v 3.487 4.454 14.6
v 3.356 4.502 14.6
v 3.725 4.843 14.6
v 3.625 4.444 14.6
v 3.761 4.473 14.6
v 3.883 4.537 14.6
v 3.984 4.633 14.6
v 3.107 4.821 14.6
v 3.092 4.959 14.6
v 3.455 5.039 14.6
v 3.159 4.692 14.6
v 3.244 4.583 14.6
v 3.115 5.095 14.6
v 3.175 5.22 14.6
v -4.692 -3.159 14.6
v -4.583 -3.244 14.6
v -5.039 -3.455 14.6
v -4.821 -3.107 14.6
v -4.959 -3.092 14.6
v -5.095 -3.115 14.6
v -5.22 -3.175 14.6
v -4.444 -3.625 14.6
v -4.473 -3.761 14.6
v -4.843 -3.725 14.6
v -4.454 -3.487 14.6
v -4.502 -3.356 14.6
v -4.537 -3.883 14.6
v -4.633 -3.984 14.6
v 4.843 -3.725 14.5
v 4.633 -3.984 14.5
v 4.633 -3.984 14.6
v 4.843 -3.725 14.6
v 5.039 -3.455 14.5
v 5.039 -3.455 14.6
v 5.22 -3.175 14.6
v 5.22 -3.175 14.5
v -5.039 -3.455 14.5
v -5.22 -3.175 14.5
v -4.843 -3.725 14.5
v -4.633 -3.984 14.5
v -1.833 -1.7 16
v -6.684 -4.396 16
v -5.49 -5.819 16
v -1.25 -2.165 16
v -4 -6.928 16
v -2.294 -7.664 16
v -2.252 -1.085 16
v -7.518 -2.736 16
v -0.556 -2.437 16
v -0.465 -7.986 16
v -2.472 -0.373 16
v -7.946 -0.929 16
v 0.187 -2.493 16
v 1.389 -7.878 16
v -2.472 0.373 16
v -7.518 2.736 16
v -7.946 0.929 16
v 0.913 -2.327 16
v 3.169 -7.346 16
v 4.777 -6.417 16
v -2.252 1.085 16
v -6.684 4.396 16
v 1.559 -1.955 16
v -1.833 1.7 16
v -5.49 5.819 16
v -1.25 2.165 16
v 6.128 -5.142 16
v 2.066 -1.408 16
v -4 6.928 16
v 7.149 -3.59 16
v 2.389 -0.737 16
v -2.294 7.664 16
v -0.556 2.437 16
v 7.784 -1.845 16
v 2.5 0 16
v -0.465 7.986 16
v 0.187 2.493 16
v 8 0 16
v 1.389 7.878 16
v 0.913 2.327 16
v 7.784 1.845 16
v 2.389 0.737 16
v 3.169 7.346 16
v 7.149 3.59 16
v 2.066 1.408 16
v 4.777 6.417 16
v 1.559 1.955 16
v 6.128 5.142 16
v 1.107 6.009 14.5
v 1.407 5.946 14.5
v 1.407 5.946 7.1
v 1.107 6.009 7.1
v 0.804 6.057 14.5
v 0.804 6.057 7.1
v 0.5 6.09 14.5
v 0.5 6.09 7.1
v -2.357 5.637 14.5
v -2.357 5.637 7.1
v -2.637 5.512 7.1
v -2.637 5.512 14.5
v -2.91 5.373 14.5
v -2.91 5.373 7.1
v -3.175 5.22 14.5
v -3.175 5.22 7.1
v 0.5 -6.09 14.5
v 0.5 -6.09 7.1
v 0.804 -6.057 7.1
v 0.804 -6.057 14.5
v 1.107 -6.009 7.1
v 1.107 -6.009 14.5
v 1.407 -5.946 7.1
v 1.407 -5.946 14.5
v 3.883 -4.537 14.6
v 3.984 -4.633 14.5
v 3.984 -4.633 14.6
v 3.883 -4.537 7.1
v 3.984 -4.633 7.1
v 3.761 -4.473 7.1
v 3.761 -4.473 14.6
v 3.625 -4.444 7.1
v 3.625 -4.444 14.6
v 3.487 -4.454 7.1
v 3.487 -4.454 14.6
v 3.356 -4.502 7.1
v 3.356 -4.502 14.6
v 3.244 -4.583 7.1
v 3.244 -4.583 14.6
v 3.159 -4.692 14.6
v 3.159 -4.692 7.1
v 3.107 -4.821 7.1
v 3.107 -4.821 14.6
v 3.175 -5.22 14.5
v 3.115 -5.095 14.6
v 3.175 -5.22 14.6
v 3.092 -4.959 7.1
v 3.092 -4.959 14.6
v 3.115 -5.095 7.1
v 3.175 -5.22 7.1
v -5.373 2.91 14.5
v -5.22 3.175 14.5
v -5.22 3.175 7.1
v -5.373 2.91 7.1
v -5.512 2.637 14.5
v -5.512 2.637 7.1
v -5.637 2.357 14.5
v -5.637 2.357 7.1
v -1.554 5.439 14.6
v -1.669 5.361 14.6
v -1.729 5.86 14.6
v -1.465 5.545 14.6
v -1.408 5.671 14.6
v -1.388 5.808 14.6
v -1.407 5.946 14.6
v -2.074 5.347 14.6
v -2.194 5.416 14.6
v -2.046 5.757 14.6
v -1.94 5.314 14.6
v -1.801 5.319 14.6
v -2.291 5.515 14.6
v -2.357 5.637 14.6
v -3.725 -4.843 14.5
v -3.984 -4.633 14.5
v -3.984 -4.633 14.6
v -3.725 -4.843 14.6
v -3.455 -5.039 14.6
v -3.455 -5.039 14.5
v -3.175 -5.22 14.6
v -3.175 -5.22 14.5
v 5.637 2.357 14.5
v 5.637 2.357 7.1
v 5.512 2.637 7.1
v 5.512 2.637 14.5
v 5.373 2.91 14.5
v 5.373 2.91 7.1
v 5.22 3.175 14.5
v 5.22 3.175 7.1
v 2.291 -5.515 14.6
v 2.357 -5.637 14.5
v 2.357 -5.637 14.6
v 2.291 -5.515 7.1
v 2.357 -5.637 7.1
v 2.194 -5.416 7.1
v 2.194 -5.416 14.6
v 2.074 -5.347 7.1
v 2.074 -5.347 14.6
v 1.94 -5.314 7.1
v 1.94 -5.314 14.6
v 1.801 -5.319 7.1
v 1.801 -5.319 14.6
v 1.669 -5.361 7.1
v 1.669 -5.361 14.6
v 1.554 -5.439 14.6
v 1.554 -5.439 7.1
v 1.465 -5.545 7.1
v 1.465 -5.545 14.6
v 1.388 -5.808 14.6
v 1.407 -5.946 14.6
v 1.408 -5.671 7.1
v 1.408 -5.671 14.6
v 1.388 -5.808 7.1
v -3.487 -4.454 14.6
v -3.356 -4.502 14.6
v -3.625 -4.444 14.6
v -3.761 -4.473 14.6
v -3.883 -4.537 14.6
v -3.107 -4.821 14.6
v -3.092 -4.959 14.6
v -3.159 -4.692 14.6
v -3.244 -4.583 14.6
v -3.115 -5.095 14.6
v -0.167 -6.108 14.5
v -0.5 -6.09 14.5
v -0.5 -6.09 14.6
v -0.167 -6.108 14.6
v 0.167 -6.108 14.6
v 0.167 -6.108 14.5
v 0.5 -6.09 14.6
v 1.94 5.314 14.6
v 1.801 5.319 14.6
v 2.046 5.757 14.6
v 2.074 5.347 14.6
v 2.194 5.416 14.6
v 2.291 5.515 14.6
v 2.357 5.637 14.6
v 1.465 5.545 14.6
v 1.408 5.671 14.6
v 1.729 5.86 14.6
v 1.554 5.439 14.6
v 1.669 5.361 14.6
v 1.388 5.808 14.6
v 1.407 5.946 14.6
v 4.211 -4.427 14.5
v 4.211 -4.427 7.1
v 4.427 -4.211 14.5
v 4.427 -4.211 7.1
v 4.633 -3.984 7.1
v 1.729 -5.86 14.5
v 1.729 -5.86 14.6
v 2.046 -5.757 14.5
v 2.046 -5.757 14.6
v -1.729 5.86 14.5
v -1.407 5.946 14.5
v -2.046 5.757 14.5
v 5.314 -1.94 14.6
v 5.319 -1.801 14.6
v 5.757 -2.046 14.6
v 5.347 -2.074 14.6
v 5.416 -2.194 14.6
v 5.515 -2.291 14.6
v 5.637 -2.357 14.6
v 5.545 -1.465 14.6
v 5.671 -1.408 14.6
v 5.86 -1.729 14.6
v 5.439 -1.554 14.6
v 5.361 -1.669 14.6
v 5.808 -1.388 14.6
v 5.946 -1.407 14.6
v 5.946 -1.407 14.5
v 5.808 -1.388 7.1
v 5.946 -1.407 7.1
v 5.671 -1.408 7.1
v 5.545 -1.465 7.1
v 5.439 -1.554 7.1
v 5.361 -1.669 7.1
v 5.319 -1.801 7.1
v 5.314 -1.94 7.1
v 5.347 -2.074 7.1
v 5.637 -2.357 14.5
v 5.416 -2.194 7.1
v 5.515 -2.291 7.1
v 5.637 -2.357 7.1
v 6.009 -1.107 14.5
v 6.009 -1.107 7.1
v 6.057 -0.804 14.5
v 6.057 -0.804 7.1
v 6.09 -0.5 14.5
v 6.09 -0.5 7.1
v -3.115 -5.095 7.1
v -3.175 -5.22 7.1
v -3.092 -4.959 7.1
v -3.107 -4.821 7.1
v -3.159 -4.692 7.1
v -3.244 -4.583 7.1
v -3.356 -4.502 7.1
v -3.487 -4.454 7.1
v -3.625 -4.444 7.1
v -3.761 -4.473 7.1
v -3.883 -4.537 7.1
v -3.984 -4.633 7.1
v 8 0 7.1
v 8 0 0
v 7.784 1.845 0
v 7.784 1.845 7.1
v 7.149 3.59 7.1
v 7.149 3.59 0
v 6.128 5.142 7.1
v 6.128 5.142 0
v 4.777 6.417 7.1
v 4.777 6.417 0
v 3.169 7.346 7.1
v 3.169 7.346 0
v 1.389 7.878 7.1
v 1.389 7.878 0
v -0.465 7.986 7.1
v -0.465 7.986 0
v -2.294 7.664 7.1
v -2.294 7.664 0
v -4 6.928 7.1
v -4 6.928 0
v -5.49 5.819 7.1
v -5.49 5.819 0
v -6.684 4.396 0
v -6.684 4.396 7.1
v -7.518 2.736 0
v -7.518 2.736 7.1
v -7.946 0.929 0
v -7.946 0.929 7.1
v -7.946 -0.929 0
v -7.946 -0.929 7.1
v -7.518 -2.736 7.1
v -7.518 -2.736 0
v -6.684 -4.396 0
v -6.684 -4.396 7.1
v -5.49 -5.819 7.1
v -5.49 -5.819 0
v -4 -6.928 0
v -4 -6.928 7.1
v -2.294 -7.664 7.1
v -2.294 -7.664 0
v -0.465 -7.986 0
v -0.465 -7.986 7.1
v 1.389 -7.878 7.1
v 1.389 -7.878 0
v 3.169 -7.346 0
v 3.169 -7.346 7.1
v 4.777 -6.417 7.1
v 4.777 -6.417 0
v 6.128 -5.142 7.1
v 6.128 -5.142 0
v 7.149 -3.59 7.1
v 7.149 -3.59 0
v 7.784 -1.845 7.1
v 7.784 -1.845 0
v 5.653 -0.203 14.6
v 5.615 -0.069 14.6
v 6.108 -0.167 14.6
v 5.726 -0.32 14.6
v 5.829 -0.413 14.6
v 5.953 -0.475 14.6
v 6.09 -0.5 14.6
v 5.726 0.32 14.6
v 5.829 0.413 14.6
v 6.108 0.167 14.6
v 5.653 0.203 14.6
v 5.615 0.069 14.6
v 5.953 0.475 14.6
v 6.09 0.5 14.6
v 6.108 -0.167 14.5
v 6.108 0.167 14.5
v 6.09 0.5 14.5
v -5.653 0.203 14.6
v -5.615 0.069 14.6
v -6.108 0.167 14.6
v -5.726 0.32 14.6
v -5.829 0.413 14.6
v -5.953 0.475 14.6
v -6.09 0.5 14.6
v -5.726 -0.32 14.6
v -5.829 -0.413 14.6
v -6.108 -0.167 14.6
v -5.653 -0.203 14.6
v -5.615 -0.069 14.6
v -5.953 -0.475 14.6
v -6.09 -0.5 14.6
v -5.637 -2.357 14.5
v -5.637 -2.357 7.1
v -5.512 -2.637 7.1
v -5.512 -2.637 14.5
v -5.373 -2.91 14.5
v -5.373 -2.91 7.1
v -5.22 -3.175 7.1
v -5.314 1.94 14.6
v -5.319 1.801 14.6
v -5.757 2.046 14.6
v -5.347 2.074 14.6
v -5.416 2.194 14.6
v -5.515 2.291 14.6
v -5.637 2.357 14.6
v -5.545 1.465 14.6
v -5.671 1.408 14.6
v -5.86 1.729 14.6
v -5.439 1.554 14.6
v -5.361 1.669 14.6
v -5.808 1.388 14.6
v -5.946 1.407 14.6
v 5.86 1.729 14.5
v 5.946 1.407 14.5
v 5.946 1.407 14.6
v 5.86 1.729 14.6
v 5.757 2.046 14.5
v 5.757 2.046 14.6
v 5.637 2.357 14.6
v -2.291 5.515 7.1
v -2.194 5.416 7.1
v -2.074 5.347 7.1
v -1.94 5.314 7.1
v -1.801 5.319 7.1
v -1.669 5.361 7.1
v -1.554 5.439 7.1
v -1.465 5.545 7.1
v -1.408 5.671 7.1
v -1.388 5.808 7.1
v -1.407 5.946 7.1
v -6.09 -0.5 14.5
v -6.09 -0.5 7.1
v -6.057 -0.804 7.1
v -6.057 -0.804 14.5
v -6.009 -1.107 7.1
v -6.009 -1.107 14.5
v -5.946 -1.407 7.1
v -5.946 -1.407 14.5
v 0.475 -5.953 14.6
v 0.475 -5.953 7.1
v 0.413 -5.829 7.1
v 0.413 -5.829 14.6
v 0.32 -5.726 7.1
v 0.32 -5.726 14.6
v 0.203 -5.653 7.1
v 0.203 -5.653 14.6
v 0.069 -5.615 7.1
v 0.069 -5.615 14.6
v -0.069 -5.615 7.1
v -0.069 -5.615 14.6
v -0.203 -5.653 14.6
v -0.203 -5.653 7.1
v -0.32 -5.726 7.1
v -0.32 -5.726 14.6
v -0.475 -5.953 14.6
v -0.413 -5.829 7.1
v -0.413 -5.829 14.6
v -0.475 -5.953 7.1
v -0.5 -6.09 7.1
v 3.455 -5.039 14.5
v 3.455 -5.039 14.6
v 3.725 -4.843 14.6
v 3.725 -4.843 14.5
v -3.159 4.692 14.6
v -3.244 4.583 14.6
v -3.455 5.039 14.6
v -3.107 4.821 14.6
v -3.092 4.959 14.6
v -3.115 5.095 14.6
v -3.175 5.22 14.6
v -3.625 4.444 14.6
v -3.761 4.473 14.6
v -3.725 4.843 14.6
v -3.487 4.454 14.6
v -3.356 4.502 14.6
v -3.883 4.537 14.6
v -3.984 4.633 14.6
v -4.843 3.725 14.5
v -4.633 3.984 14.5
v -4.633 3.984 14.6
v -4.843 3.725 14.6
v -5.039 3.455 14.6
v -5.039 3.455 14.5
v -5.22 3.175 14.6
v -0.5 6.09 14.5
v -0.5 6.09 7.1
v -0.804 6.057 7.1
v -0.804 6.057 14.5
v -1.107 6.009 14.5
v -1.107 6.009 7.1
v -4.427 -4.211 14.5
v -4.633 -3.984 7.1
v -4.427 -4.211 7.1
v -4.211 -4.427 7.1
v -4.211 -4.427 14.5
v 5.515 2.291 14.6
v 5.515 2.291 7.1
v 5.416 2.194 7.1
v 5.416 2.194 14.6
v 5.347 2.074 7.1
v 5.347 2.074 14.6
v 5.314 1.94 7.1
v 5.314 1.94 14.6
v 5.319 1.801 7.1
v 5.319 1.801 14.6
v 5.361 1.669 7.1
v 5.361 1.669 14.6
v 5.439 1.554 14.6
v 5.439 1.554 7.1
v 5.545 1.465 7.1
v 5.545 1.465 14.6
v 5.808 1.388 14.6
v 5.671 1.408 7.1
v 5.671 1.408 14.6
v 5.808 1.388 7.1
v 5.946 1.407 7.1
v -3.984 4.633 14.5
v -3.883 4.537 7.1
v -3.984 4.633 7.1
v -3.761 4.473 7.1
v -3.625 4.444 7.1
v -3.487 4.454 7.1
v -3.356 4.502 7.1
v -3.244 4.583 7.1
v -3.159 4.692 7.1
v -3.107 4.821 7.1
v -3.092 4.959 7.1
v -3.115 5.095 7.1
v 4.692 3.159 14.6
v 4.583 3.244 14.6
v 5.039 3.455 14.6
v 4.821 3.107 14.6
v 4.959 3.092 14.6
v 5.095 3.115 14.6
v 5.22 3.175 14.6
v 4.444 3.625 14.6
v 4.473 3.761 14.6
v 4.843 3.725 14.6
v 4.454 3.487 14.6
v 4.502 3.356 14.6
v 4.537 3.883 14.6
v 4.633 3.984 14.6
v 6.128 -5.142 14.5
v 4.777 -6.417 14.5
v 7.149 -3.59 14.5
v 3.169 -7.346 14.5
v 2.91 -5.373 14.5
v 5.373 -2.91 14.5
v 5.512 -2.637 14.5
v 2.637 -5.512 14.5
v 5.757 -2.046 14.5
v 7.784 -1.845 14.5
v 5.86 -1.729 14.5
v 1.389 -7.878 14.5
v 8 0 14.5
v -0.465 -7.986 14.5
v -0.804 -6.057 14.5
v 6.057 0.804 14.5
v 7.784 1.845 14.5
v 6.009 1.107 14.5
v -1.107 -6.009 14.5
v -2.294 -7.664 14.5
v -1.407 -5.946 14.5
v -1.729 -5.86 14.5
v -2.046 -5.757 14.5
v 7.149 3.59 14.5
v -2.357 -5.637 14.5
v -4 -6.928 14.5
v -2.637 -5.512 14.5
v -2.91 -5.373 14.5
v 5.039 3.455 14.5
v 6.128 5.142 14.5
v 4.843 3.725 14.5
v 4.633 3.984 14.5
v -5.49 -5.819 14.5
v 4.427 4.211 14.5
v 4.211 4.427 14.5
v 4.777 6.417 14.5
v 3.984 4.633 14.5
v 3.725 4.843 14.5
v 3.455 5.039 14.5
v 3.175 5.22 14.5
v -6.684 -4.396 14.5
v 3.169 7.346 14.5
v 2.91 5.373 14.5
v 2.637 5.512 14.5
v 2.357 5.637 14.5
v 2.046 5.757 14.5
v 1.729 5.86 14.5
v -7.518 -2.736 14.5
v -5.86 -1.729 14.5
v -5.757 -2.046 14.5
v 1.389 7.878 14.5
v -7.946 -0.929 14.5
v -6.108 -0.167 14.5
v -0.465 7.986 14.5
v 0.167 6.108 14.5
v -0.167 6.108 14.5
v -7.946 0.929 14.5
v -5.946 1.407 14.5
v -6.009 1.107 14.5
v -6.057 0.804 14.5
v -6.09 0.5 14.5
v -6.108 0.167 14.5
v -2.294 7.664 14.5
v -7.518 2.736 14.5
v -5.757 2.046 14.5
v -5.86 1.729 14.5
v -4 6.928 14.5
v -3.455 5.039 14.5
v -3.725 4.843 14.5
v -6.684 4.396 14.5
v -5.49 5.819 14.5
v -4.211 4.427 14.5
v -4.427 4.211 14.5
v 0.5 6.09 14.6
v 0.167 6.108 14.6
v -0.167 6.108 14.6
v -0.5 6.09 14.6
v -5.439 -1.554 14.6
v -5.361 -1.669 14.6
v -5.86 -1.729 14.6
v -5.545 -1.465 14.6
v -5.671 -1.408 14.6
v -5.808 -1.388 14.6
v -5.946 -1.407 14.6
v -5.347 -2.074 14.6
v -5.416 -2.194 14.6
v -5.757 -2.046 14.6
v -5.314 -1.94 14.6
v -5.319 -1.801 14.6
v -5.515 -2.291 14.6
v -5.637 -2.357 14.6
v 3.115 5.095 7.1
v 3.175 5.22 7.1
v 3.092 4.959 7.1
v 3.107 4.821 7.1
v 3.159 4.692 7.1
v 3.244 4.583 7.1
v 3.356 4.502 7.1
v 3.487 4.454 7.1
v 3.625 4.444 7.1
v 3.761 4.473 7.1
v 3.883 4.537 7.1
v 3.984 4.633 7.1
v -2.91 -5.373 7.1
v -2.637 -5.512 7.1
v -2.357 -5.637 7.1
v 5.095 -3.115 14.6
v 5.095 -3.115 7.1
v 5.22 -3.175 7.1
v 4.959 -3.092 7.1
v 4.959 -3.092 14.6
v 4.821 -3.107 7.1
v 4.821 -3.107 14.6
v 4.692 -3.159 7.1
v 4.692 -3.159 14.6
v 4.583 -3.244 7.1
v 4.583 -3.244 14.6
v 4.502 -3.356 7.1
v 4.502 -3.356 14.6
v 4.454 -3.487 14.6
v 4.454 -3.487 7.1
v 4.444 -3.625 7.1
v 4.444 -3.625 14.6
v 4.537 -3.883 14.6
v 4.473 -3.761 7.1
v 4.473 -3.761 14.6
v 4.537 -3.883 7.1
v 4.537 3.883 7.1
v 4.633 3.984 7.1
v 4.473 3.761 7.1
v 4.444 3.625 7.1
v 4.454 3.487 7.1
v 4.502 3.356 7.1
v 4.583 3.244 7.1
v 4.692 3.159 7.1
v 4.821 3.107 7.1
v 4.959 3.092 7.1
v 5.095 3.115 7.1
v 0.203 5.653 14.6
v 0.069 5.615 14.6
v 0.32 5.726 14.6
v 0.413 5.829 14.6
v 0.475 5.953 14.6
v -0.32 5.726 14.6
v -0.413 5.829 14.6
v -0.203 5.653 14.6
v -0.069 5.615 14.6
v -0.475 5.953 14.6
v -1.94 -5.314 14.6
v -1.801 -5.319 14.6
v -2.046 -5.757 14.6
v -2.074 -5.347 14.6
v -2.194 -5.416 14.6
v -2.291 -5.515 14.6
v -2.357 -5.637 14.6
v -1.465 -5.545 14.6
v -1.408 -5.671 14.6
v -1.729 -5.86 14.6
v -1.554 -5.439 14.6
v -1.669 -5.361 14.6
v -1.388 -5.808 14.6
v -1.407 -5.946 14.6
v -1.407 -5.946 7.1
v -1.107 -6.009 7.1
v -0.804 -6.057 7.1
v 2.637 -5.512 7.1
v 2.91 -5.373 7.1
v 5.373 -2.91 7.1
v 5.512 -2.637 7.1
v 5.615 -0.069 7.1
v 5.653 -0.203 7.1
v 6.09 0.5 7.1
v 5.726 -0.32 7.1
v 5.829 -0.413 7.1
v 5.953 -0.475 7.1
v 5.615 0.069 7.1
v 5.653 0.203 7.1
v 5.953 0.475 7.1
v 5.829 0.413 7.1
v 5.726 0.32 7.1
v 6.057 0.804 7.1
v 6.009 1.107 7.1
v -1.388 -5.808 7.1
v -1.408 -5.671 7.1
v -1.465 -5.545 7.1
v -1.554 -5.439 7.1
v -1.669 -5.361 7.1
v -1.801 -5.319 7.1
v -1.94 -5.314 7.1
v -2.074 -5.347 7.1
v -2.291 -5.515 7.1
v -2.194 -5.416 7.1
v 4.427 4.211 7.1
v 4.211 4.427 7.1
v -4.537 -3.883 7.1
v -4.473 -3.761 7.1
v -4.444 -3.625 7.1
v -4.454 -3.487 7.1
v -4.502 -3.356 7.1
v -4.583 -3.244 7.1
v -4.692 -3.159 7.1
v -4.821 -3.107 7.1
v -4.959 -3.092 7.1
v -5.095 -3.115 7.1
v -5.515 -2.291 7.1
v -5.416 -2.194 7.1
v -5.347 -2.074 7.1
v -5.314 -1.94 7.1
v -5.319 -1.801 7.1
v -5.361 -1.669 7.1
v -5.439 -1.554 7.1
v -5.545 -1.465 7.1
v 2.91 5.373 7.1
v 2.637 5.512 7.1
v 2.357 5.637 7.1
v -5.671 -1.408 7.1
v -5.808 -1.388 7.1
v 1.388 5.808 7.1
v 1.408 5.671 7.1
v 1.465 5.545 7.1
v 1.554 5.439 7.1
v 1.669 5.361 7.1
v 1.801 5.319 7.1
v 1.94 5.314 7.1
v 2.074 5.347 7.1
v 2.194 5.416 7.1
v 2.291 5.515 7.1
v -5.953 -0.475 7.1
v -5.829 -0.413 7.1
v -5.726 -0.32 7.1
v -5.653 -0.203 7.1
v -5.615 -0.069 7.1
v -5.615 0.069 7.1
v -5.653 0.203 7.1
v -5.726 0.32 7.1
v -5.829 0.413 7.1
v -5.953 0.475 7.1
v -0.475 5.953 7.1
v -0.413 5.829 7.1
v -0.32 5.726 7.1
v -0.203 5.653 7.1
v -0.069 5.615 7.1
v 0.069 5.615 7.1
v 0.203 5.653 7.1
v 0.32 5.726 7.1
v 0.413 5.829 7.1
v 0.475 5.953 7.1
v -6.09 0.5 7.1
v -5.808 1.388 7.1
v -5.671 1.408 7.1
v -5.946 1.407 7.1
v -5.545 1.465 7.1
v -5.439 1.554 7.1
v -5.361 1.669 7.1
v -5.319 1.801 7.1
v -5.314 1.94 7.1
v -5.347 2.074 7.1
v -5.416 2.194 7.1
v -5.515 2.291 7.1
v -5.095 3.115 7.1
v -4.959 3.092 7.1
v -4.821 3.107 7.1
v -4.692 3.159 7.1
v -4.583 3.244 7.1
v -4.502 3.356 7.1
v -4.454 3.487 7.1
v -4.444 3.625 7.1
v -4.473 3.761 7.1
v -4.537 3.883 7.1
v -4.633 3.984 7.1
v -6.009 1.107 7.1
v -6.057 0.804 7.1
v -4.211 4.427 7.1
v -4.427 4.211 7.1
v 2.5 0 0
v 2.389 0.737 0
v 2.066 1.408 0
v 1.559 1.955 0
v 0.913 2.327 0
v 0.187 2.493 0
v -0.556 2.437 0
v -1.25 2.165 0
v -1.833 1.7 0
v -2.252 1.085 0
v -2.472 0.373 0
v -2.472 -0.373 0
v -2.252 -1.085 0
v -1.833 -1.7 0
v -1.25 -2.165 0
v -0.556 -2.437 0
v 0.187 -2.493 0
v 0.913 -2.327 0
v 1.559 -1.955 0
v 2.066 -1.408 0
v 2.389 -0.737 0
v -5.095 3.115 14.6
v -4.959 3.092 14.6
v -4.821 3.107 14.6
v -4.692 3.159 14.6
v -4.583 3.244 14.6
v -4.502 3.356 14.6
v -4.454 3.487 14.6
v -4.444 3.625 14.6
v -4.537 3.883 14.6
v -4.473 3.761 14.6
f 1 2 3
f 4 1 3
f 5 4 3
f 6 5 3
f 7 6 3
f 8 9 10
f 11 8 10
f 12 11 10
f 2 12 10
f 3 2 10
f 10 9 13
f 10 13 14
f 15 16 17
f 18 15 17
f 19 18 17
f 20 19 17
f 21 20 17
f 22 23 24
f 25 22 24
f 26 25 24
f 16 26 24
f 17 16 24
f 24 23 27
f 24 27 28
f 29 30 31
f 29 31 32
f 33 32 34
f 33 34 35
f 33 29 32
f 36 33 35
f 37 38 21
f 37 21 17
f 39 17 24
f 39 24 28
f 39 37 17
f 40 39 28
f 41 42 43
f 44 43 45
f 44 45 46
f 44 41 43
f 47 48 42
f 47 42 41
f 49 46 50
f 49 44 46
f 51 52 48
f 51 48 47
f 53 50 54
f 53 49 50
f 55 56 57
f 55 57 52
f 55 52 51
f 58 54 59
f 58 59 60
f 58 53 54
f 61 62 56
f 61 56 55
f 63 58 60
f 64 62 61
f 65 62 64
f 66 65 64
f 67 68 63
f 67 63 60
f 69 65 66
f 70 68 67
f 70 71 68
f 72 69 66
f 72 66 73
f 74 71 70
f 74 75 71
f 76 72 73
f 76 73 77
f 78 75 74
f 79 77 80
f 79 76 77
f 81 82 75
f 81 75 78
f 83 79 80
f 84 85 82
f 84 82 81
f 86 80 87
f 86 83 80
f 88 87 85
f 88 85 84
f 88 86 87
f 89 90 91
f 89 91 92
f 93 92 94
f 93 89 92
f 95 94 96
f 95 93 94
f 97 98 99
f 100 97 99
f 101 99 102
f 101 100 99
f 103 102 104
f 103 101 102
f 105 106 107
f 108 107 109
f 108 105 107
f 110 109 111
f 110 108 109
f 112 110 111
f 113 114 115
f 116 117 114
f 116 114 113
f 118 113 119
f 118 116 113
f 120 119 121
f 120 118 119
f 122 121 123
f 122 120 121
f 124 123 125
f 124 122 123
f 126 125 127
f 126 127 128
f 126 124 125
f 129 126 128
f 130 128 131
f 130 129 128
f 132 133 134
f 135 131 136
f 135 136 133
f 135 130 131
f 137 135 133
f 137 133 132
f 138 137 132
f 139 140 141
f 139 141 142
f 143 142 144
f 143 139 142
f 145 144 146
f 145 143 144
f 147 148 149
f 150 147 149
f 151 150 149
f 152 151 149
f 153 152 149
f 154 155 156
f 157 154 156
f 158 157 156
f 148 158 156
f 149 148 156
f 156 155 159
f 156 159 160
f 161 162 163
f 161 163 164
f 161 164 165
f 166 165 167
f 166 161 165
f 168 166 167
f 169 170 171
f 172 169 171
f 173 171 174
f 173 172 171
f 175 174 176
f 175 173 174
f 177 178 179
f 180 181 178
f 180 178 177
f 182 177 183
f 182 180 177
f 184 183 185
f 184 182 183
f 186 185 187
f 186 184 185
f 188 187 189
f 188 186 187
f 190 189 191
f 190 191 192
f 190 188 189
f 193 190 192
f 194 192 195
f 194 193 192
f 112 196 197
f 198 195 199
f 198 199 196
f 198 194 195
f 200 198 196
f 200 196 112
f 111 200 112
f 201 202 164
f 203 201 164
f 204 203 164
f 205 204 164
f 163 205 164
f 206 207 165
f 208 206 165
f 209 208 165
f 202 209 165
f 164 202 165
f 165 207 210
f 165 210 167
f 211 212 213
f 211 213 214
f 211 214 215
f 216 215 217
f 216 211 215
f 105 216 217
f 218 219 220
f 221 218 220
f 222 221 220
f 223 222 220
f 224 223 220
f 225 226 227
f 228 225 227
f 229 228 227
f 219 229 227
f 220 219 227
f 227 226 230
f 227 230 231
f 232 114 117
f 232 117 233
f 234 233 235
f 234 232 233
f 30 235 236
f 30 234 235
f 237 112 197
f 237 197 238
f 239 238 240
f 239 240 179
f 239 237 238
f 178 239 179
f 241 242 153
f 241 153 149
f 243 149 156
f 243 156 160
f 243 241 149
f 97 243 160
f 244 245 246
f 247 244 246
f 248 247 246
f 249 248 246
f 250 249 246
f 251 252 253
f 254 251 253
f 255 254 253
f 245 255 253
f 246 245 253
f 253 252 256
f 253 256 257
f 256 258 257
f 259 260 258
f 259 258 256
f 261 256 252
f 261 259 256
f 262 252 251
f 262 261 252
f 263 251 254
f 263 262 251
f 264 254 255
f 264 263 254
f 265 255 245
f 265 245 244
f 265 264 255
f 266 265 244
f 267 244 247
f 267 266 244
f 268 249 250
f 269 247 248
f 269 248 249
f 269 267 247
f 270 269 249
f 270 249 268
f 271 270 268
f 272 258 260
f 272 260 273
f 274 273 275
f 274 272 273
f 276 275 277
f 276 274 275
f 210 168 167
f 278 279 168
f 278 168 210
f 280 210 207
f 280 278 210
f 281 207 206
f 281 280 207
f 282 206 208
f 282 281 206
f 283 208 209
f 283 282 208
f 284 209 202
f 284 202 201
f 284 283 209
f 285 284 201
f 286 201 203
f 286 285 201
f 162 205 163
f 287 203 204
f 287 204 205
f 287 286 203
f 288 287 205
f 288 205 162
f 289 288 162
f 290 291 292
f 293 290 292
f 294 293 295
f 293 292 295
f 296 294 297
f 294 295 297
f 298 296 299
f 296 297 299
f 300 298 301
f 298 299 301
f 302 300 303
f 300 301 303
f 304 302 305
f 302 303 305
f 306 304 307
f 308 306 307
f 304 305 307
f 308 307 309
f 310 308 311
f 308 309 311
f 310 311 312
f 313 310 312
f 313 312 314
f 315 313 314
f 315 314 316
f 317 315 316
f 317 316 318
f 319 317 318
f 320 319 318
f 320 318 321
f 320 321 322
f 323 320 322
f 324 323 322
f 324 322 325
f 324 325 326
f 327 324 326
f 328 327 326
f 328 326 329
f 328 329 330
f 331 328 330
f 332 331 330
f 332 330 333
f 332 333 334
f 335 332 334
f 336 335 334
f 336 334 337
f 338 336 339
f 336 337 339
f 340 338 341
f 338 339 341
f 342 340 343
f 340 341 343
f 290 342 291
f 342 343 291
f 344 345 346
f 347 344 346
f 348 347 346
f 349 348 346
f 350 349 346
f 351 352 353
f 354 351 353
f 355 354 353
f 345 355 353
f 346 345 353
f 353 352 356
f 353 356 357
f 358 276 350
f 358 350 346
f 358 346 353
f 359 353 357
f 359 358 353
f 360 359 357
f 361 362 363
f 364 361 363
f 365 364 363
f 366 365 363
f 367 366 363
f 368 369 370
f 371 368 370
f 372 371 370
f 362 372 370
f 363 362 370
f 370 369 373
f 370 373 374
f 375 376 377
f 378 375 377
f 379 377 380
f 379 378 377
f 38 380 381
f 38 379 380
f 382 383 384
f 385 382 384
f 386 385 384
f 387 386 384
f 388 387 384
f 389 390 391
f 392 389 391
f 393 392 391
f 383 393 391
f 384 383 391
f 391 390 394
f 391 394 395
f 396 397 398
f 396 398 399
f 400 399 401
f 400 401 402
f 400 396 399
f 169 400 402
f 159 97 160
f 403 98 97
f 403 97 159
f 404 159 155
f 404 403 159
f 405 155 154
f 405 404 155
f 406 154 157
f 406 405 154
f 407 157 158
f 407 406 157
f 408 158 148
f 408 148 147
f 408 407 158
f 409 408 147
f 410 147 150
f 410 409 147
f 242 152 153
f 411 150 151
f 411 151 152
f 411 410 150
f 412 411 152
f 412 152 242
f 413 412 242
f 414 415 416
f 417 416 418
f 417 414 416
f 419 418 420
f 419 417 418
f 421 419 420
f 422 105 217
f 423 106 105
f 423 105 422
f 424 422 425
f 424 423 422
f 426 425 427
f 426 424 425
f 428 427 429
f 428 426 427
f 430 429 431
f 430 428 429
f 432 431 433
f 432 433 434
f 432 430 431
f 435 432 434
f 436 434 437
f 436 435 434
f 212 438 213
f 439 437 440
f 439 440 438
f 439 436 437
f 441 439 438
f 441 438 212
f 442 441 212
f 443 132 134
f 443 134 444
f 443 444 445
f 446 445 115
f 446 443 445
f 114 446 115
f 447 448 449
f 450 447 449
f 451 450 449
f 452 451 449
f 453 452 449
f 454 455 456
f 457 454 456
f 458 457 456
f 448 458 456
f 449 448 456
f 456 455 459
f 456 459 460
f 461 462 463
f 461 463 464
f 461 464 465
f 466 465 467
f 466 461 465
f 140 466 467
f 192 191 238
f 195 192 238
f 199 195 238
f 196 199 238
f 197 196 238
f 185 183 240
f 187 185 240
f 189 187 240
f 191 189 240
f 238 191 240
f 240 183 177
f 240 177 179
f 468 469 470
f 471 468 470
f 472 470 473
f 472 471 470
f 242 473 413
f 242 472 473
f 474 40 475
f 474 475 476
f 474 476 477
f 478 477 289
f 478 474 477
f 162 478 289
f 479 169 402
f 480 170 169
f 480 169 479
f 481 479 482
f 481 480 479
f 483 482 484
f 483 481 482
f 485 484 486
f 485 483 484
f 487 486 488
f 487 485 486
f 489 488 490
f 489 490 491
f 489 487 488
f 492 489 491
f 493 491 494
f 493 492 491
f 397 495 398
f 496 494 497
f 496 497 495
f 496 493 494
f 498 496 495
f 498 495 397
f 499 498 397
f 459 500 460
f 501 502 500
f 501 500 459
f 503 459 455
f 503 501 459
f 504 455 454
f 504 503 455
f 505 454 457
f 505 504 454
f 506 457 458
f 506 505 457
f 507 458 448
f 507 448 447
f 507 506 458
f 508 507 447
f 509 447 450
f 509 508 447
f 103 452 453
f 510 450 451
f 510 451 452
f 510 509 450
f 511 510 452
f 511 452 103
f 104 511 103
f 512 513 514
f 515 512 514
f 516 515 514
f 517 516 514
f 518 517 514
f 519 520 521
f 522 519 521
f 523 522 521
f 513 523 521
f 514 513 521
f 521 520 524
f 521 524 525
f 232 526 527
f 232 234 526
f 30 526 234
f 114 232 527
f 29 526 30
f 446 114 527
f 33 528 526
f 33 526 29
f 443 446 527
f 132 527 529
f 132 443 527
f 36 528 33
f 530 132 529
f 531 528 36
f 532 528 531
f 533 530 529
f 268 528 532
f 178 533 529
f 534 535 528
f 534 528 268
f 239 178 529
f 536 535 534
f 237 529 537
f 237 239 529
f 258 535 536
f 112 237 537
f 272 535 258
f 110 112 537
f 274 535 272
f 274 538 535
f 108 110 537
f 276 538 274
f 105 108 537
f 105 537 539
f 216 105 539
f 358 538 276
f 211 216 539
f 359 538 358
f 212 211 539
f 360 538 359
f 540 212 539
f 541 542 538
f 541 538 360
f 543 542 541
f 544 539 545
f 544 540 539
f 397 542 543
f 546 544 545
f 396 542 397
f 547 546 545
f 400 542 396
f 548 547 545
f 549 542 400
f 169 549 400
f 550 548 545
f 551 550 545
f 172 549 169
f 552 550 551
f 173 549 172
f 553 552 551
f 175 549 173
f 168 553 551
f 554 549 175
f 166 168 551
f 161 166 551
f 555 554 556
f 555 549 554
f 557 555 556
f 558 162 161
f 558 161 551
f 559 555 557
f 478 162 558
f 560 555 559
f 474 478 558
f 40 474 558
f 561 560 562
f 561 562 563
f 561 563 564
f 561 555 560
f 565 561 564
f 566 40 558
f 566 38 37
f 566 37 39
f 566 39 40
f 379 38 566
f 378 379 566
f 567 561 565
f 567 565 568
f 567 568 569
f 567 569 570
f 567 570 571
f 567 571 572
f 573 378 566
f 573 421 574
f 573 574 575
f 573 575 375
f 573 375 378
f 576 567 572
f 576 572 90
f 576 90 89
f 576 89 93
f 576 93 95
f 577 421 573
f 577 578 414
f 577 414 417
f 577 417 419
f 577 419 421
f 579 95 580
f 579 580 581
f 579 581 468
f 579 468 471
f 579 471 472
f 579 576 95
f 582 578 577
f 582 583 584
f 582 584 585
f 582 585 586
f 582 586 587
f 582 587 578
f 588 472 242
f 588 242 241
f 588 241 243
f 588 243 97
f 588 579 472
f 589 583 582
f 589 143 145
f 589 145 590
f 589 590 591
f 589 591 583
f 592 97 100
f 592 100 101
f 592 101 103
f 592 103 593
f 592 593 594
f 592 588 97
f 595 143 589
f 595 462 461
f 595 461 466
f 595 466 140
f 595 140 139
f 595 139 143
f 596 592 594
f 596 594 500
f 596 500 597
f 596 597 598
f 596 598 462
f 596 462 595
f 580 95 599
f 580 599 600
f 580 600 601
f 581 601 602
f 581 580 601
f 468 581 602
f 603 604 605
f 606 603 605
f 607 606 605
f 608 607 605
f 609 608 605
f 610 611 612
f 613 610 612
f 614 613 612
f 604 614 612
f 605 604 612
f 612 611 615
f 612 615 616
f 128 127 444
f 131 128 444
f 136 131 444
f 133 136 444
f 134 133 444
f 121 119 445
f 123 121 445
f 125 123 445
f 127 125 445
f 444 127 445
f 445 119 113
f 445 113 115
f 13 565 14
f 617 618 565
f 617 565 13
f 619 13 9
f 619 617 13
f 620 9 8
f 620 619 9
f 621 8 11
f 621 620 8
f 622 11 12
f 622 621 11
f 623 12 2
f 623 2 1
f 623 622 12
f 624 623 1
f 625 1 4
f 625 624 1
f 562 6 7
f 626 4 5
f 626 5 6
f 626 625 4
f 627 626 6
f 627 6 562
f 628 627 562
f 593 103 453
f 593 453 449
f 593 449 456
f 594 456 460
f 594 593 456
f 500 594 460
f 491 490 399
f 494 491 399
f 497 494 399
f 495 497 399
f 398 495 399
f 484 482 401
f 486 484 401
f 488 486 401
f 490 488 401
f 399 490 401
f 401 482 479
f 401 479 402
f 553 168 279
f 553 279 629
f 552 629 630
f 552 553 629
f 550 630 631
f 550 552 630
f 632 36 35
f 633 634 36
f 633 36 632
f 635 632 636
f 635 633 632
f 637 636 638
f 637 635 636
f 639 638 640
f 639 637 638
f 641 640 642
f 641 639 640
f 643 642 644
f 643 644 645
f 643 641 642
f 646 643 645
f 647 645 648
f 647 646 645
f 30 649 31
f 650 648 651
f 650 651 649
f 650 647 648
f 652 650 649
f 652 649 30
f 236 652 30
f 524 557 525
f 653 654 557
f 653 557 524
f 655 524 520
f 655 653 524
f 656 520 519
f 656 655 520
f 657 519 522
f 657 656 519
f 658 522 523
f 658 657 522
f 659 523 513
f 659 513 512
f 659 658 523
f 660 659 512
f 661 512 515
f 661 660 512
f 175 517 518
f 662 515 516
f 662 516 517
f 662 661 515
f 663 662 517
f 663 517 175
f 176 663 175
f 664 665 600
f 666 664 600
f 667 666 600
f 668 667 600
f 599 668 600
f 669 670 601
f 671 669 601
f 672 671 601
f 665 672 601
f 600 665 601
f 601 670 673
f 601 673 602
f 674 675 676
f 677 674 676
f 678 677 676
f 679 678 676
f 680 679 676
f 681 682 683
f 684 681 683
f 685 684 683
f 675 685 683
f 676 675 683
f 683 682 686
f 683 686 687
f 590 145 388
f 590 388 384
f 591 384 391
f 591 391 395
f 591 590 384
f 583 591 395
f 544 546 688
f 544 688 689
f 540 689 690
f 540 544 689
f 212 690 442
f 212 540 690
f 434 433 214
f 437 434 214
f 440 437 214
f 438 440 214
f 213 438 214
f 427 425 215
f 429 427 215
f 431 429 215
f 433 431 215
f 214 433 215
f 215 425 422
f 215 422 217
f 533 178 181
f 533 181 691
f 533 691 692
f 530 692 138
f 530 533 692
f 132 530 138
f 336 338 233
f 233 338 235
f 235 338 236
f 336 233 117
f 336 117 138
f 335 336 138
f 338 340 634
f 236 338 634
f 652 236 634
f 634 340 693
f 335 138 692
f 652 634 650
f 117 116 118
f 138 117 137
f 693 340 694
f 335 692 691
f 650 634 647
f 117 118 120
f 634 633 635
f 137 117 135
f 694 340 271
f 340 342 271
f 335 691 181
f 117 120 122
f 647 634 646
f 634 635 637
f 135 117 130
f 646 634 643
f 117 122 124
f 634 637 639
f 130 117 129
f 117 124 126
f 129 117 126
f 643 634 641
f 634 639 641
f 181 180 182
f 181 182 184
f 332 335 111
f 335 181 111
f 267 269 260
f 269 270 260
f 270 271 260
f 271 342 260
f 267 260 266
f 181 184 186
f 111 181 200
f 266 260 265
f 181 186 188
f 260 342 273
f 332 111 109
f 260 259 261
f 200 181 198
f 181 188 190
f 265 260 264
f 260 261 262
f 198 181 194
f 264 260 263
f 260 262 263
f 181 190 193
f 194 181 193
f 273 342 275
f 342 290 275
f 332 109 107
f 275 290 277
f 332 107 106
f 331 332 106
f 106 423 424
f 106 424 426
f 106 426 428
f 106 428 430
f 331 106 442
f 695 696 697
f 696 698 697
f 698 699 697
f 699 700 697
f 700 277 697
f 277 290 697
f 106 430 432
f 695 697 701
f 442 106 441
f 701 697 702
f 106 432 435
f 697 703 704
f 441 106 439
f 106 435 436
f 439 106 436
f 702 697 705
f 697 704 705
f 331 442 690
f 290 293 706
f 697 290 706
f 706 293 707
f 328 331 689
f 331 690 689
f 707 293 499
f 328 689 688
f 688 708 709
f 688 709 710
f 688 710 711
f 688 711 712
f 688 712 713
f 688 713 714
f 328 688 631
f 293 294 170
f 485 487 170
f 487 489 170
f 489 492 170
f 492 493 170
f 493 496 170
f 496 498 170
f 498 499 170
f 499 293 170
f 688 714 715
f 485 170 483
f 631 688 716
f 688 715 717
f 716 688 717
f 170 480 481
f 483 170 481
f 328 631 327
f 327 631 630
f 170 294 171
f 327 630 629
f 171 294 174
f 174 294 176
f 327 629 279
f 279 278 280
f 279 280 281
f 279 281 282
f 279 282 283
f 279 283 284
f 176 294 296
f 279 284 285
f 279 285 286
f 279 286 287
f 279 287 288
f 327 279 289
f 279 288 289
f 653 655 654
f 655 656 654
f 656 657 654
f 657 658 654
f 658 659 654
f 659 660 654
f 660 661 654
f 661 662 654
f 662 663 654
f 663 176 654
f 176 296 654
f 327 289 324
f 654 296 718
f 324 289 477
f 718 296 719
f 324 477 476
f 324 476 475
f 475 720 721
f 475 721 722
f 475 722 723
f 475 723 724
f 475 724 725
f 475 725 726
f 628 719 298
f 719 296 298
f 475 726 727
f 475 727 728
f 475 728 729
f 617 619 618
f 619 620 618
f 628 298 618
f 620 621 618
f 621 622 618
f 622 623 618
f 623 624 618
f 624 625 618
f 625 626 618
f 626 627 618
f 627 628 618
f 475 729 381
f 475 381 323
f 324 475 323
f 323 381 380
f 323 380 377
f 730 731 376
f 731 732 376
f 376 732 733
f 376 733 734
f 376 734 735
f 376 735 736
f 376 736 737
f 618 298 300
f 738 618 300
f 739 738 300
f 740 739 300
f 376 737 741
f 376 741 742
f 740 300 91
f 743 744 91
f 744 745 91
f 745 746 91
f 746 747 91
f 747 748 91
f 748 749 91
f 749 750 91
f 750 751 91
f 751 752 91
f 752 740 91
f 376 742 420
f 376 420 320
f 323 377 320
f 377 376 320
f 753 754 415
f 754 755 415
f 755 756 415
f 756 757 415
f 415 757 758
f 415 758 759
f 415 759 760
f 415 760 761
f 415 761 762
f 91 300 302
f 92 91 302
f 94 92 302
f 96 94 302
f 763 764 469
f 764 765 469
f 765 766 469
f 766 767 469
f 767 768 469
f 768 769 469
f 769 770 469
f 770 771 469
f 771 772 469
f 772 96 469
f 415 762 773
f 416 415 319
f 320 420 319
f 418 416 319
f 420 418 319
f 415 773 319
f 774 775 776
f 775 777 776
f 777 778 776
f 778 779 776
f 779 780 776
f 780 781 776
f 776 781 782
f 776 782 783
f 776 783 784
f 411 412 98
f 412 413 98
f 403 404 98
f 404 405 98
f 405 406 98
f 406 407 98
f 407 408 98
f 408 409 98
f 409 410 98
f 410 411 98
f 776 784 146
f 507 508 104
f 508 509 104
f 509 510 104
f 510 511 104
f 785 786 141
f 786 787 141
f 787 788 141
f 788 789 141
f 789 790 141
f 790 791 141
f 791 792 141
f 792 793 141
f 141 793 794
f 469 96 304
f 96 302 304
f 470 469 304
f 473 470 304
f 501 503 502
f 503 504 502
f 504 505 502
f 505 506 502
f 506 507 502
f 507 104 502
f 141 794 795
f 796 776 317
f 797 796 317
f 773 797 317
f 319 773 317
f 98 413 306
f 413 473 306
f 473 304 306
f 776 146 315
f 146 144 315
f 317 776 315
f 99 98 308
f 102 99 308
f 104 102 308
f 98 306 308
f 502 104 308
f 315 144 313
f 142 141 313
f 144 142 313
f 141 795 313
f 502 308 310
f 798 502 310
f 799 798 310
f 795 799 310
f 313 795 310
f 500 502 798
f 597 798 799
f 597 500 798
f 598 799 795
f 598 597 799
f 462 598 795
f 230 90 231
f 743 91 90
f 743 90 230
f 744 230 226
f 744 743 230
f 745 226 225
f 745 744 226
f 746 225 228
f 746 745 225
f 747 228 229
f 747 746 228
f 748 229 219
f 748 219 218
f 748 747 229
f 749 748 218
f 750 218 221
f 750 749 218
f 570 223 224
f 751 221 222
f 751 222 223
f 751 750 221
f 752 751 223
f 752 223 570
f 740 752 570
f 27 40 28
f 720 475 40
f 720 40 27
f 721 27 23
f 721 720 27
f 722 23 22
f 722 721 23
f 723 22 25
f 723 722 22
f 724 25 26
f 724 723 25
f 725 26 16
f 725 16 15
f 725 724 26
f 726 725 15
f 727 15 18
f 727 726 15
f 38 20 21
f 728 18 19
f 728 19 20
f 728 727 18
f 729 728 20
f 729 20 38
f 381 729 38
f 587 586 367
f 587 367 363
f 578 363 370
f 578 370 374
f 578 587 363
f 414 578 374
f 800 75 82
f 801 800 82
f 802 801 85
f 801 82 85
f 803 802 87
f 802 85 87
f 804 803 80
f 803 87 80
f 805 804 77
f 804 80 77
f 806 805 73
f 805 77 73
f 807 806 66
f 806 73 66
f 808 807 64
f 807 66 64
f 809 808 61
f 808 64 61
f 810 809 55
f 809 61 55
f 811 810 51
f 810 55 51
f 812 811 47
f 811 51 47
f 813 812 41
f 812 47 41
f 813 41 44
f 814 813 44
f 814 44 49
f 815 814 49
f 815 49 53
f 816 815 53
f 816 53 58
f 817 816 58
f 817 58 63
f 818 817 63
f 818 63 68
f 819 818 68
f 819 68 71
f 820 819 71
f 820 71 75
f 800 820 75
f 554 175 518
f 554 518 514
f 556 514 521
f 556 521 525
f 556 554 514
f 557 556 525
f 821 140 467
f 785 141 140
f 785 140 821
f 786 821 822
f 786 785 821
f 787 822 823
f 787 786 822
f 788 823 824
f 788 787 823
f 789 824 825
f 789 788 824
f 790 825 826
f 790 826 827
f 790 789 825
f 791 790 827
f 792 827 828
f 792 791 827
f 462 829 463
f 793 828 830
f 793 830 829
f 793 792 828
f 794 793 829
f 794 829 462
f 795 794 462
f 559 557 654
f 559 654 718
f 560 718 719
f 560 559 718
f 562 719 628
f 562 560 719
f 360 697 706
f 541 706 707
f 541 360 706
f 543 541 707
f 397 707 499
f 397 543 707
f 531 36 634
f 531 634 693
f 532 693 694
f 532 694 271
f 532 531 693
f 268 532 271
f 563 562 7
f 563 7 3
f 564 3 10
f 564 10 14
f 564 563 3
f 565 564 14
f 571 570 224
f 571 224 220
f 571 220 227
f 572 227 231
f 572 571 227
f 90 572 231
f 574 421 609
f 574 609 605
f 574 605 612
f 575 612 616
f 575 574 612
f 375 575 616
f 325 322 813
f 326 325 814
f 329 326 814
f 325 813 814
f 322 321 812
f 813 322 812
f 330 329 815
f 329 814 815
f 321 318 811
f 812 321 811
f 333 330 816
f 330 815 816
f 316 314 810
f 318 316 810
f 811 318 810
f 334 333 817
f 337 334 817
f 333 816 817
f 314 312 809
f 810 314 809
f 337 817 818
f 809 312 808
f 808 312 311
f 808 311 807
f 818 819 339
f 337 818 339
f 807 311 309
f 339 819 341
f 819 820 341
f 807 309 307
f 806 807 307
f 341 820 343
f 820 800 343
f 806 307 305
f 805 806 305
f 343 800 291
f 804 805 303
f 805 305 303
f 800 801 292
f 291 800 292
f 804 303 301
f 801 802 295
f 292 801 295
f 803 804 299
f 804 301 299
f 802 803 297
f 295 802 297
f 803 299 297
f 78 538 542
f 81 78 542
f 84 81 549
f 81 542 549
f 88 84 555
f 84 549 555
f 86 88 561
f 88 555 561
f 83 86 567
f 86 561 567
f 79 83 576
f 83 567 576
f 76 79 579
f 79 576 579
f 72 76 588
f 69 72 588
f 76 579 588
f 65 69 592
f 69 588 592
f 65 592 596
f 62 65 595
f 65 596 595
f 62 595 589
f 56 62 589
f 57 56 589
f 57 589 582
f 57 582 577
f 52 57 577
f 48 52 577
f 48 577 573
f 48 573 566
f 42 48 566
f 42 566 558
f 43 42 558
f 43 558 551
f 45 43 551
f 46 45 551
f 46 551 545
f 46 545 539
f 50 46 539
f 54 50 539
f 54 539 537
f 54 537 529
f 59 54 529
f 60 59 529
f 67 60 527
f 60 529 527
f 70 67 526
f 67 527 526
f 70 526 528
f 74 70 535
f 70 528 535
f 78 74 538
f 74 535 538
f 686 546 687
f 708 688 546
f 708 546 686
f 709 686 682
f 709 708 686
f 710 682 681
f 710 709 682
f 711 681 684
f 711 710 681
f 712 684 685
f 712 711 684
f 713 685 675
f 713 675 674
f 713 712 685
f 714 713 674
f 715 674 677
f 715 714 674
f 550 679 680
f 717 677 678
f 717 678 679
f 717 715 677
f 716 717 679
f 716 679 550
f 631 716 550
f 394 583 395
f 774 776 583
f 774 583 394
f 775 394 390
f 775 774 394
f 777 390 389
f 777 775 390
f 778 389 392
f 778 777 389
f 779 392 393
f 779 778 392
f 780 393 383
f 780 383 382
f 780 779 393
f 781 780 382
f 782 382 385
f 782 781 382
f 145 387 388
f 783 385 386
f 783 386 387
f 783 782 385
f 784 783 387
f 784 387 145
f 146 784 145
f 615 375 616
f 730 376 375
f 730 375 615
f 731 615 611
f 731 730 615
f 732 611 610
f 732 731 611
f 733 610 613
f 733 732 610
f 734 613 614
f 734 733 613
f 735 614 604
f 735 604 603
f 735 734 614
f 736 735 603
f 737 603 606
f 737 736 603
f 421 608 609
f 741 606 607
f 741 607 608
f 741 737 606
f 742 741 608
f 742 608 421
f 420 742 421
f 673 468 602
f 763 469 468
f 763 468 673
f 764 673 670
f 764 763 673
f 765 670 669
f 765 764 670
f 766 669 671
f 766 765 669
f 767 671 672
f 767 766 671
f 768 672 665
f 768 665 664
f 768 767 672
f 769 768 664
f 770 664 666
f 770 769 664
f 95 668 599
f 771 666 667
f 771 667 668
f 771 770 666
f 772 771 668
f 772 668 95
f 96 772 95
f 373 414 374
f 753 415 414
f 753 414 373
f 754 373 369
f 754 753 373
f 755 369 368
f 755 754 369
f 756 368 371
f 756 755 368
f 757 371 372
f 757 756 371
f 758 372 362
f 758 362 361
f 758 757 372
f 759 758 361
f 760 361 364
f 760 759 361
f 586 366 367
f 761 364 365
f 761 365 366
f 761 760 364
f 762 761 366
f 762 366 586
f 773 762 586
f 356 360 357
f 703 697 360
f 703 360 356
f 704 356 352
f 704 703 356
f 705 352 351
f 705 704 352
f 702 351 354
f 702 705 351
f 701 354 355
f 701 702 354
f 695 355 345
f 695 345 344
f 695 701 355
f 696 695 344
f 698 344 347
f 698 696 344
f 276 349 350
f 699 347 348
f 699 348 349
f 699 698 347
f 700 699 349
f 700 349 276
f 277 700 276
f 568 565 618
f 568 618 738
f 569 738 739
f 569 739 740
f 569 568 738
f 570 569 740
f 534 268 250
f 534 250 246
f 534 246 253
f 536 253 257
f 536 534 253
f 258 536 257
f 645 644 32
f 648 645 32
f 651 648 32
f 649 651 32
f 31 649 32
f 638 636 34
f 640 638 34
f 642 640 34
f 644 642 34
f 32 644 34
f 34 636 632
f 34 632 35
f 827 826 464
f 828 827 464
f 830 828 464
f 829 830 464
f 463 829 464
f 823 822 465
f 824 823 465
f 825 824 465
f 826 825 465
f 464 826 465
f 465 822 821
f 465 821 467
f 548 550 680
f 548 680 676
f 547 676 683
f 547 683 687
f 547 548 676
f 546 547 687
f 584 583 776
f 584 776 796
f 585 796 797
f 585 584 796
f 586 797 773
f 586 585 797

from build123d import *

# Parameters (mm, degrees)
SKETCH_R           = 8
PAD_DEPTH          = 16
SKETCH001_W        = 1.89
SKETCH001_H        = 7.4
SKETCH002_R        = 2.5
POCKET_DEPTH       = 16.001
POCKET001_DEPTH    = 7.5
POLARPATTERN_COUNT = 20


with BuildPart() as part:
    # Sketch → Pad (new body)
    with BuildSketch(Plane.XY):
        Circle(SKETCH_R)
    extrude(amount=PAD_DEPTH)

    # Sketch001 → Groove (revolve, cut)
    with BuildSketch(Plane.XZ):
        with Locations((7.055, 10.8)):
            Rectangle(SKETCH001_W, SKETCH001_H)
    revolve(axis=Axis((0, 0, 0), (0, 0, 1)), mode=Mode.SUBTRACT)

    # Sketch002 (on Face7 of Groove) → Pocket (cut, through all)
    with BuildSketch(Plane.XY.offset(16)):
        Circle(SKETCH002_R)
    extrude(amount=-POCKET_DEPTH, mode=Mode.SUBTRACT)

    # Sketch003 (on Face3 of Pocket) → Pocket001 (cut)
    with BuildSketch(Plane.XY.offset(7.1)):
        with BuildLine():
            ThreePointArc((6.089542, 0.499581), (5.61, 0), (6.089542, -0.499581))
            ThreePointArc((6.089542, -0.499581), (6.11, 0), (6.089542, 0.499581))
        make_face()
    pocket001 = extrude(amount=POCKET001_DEPTH, mode=Mode.SUBTRACT)

    # PolarPattern: Pocket001 ×20 about axis
    polarpattern_axis = Axis((0, 0, 7.1), (0, 0, 1))
    for i in range(1, POLARPATTERN_COUNT):
        add(pocket001.rotate(polarpattern_axis, i * 360 / POLARPATTERN_COUNT), mode=Mode.SUBTRACT)


solid = part.part
